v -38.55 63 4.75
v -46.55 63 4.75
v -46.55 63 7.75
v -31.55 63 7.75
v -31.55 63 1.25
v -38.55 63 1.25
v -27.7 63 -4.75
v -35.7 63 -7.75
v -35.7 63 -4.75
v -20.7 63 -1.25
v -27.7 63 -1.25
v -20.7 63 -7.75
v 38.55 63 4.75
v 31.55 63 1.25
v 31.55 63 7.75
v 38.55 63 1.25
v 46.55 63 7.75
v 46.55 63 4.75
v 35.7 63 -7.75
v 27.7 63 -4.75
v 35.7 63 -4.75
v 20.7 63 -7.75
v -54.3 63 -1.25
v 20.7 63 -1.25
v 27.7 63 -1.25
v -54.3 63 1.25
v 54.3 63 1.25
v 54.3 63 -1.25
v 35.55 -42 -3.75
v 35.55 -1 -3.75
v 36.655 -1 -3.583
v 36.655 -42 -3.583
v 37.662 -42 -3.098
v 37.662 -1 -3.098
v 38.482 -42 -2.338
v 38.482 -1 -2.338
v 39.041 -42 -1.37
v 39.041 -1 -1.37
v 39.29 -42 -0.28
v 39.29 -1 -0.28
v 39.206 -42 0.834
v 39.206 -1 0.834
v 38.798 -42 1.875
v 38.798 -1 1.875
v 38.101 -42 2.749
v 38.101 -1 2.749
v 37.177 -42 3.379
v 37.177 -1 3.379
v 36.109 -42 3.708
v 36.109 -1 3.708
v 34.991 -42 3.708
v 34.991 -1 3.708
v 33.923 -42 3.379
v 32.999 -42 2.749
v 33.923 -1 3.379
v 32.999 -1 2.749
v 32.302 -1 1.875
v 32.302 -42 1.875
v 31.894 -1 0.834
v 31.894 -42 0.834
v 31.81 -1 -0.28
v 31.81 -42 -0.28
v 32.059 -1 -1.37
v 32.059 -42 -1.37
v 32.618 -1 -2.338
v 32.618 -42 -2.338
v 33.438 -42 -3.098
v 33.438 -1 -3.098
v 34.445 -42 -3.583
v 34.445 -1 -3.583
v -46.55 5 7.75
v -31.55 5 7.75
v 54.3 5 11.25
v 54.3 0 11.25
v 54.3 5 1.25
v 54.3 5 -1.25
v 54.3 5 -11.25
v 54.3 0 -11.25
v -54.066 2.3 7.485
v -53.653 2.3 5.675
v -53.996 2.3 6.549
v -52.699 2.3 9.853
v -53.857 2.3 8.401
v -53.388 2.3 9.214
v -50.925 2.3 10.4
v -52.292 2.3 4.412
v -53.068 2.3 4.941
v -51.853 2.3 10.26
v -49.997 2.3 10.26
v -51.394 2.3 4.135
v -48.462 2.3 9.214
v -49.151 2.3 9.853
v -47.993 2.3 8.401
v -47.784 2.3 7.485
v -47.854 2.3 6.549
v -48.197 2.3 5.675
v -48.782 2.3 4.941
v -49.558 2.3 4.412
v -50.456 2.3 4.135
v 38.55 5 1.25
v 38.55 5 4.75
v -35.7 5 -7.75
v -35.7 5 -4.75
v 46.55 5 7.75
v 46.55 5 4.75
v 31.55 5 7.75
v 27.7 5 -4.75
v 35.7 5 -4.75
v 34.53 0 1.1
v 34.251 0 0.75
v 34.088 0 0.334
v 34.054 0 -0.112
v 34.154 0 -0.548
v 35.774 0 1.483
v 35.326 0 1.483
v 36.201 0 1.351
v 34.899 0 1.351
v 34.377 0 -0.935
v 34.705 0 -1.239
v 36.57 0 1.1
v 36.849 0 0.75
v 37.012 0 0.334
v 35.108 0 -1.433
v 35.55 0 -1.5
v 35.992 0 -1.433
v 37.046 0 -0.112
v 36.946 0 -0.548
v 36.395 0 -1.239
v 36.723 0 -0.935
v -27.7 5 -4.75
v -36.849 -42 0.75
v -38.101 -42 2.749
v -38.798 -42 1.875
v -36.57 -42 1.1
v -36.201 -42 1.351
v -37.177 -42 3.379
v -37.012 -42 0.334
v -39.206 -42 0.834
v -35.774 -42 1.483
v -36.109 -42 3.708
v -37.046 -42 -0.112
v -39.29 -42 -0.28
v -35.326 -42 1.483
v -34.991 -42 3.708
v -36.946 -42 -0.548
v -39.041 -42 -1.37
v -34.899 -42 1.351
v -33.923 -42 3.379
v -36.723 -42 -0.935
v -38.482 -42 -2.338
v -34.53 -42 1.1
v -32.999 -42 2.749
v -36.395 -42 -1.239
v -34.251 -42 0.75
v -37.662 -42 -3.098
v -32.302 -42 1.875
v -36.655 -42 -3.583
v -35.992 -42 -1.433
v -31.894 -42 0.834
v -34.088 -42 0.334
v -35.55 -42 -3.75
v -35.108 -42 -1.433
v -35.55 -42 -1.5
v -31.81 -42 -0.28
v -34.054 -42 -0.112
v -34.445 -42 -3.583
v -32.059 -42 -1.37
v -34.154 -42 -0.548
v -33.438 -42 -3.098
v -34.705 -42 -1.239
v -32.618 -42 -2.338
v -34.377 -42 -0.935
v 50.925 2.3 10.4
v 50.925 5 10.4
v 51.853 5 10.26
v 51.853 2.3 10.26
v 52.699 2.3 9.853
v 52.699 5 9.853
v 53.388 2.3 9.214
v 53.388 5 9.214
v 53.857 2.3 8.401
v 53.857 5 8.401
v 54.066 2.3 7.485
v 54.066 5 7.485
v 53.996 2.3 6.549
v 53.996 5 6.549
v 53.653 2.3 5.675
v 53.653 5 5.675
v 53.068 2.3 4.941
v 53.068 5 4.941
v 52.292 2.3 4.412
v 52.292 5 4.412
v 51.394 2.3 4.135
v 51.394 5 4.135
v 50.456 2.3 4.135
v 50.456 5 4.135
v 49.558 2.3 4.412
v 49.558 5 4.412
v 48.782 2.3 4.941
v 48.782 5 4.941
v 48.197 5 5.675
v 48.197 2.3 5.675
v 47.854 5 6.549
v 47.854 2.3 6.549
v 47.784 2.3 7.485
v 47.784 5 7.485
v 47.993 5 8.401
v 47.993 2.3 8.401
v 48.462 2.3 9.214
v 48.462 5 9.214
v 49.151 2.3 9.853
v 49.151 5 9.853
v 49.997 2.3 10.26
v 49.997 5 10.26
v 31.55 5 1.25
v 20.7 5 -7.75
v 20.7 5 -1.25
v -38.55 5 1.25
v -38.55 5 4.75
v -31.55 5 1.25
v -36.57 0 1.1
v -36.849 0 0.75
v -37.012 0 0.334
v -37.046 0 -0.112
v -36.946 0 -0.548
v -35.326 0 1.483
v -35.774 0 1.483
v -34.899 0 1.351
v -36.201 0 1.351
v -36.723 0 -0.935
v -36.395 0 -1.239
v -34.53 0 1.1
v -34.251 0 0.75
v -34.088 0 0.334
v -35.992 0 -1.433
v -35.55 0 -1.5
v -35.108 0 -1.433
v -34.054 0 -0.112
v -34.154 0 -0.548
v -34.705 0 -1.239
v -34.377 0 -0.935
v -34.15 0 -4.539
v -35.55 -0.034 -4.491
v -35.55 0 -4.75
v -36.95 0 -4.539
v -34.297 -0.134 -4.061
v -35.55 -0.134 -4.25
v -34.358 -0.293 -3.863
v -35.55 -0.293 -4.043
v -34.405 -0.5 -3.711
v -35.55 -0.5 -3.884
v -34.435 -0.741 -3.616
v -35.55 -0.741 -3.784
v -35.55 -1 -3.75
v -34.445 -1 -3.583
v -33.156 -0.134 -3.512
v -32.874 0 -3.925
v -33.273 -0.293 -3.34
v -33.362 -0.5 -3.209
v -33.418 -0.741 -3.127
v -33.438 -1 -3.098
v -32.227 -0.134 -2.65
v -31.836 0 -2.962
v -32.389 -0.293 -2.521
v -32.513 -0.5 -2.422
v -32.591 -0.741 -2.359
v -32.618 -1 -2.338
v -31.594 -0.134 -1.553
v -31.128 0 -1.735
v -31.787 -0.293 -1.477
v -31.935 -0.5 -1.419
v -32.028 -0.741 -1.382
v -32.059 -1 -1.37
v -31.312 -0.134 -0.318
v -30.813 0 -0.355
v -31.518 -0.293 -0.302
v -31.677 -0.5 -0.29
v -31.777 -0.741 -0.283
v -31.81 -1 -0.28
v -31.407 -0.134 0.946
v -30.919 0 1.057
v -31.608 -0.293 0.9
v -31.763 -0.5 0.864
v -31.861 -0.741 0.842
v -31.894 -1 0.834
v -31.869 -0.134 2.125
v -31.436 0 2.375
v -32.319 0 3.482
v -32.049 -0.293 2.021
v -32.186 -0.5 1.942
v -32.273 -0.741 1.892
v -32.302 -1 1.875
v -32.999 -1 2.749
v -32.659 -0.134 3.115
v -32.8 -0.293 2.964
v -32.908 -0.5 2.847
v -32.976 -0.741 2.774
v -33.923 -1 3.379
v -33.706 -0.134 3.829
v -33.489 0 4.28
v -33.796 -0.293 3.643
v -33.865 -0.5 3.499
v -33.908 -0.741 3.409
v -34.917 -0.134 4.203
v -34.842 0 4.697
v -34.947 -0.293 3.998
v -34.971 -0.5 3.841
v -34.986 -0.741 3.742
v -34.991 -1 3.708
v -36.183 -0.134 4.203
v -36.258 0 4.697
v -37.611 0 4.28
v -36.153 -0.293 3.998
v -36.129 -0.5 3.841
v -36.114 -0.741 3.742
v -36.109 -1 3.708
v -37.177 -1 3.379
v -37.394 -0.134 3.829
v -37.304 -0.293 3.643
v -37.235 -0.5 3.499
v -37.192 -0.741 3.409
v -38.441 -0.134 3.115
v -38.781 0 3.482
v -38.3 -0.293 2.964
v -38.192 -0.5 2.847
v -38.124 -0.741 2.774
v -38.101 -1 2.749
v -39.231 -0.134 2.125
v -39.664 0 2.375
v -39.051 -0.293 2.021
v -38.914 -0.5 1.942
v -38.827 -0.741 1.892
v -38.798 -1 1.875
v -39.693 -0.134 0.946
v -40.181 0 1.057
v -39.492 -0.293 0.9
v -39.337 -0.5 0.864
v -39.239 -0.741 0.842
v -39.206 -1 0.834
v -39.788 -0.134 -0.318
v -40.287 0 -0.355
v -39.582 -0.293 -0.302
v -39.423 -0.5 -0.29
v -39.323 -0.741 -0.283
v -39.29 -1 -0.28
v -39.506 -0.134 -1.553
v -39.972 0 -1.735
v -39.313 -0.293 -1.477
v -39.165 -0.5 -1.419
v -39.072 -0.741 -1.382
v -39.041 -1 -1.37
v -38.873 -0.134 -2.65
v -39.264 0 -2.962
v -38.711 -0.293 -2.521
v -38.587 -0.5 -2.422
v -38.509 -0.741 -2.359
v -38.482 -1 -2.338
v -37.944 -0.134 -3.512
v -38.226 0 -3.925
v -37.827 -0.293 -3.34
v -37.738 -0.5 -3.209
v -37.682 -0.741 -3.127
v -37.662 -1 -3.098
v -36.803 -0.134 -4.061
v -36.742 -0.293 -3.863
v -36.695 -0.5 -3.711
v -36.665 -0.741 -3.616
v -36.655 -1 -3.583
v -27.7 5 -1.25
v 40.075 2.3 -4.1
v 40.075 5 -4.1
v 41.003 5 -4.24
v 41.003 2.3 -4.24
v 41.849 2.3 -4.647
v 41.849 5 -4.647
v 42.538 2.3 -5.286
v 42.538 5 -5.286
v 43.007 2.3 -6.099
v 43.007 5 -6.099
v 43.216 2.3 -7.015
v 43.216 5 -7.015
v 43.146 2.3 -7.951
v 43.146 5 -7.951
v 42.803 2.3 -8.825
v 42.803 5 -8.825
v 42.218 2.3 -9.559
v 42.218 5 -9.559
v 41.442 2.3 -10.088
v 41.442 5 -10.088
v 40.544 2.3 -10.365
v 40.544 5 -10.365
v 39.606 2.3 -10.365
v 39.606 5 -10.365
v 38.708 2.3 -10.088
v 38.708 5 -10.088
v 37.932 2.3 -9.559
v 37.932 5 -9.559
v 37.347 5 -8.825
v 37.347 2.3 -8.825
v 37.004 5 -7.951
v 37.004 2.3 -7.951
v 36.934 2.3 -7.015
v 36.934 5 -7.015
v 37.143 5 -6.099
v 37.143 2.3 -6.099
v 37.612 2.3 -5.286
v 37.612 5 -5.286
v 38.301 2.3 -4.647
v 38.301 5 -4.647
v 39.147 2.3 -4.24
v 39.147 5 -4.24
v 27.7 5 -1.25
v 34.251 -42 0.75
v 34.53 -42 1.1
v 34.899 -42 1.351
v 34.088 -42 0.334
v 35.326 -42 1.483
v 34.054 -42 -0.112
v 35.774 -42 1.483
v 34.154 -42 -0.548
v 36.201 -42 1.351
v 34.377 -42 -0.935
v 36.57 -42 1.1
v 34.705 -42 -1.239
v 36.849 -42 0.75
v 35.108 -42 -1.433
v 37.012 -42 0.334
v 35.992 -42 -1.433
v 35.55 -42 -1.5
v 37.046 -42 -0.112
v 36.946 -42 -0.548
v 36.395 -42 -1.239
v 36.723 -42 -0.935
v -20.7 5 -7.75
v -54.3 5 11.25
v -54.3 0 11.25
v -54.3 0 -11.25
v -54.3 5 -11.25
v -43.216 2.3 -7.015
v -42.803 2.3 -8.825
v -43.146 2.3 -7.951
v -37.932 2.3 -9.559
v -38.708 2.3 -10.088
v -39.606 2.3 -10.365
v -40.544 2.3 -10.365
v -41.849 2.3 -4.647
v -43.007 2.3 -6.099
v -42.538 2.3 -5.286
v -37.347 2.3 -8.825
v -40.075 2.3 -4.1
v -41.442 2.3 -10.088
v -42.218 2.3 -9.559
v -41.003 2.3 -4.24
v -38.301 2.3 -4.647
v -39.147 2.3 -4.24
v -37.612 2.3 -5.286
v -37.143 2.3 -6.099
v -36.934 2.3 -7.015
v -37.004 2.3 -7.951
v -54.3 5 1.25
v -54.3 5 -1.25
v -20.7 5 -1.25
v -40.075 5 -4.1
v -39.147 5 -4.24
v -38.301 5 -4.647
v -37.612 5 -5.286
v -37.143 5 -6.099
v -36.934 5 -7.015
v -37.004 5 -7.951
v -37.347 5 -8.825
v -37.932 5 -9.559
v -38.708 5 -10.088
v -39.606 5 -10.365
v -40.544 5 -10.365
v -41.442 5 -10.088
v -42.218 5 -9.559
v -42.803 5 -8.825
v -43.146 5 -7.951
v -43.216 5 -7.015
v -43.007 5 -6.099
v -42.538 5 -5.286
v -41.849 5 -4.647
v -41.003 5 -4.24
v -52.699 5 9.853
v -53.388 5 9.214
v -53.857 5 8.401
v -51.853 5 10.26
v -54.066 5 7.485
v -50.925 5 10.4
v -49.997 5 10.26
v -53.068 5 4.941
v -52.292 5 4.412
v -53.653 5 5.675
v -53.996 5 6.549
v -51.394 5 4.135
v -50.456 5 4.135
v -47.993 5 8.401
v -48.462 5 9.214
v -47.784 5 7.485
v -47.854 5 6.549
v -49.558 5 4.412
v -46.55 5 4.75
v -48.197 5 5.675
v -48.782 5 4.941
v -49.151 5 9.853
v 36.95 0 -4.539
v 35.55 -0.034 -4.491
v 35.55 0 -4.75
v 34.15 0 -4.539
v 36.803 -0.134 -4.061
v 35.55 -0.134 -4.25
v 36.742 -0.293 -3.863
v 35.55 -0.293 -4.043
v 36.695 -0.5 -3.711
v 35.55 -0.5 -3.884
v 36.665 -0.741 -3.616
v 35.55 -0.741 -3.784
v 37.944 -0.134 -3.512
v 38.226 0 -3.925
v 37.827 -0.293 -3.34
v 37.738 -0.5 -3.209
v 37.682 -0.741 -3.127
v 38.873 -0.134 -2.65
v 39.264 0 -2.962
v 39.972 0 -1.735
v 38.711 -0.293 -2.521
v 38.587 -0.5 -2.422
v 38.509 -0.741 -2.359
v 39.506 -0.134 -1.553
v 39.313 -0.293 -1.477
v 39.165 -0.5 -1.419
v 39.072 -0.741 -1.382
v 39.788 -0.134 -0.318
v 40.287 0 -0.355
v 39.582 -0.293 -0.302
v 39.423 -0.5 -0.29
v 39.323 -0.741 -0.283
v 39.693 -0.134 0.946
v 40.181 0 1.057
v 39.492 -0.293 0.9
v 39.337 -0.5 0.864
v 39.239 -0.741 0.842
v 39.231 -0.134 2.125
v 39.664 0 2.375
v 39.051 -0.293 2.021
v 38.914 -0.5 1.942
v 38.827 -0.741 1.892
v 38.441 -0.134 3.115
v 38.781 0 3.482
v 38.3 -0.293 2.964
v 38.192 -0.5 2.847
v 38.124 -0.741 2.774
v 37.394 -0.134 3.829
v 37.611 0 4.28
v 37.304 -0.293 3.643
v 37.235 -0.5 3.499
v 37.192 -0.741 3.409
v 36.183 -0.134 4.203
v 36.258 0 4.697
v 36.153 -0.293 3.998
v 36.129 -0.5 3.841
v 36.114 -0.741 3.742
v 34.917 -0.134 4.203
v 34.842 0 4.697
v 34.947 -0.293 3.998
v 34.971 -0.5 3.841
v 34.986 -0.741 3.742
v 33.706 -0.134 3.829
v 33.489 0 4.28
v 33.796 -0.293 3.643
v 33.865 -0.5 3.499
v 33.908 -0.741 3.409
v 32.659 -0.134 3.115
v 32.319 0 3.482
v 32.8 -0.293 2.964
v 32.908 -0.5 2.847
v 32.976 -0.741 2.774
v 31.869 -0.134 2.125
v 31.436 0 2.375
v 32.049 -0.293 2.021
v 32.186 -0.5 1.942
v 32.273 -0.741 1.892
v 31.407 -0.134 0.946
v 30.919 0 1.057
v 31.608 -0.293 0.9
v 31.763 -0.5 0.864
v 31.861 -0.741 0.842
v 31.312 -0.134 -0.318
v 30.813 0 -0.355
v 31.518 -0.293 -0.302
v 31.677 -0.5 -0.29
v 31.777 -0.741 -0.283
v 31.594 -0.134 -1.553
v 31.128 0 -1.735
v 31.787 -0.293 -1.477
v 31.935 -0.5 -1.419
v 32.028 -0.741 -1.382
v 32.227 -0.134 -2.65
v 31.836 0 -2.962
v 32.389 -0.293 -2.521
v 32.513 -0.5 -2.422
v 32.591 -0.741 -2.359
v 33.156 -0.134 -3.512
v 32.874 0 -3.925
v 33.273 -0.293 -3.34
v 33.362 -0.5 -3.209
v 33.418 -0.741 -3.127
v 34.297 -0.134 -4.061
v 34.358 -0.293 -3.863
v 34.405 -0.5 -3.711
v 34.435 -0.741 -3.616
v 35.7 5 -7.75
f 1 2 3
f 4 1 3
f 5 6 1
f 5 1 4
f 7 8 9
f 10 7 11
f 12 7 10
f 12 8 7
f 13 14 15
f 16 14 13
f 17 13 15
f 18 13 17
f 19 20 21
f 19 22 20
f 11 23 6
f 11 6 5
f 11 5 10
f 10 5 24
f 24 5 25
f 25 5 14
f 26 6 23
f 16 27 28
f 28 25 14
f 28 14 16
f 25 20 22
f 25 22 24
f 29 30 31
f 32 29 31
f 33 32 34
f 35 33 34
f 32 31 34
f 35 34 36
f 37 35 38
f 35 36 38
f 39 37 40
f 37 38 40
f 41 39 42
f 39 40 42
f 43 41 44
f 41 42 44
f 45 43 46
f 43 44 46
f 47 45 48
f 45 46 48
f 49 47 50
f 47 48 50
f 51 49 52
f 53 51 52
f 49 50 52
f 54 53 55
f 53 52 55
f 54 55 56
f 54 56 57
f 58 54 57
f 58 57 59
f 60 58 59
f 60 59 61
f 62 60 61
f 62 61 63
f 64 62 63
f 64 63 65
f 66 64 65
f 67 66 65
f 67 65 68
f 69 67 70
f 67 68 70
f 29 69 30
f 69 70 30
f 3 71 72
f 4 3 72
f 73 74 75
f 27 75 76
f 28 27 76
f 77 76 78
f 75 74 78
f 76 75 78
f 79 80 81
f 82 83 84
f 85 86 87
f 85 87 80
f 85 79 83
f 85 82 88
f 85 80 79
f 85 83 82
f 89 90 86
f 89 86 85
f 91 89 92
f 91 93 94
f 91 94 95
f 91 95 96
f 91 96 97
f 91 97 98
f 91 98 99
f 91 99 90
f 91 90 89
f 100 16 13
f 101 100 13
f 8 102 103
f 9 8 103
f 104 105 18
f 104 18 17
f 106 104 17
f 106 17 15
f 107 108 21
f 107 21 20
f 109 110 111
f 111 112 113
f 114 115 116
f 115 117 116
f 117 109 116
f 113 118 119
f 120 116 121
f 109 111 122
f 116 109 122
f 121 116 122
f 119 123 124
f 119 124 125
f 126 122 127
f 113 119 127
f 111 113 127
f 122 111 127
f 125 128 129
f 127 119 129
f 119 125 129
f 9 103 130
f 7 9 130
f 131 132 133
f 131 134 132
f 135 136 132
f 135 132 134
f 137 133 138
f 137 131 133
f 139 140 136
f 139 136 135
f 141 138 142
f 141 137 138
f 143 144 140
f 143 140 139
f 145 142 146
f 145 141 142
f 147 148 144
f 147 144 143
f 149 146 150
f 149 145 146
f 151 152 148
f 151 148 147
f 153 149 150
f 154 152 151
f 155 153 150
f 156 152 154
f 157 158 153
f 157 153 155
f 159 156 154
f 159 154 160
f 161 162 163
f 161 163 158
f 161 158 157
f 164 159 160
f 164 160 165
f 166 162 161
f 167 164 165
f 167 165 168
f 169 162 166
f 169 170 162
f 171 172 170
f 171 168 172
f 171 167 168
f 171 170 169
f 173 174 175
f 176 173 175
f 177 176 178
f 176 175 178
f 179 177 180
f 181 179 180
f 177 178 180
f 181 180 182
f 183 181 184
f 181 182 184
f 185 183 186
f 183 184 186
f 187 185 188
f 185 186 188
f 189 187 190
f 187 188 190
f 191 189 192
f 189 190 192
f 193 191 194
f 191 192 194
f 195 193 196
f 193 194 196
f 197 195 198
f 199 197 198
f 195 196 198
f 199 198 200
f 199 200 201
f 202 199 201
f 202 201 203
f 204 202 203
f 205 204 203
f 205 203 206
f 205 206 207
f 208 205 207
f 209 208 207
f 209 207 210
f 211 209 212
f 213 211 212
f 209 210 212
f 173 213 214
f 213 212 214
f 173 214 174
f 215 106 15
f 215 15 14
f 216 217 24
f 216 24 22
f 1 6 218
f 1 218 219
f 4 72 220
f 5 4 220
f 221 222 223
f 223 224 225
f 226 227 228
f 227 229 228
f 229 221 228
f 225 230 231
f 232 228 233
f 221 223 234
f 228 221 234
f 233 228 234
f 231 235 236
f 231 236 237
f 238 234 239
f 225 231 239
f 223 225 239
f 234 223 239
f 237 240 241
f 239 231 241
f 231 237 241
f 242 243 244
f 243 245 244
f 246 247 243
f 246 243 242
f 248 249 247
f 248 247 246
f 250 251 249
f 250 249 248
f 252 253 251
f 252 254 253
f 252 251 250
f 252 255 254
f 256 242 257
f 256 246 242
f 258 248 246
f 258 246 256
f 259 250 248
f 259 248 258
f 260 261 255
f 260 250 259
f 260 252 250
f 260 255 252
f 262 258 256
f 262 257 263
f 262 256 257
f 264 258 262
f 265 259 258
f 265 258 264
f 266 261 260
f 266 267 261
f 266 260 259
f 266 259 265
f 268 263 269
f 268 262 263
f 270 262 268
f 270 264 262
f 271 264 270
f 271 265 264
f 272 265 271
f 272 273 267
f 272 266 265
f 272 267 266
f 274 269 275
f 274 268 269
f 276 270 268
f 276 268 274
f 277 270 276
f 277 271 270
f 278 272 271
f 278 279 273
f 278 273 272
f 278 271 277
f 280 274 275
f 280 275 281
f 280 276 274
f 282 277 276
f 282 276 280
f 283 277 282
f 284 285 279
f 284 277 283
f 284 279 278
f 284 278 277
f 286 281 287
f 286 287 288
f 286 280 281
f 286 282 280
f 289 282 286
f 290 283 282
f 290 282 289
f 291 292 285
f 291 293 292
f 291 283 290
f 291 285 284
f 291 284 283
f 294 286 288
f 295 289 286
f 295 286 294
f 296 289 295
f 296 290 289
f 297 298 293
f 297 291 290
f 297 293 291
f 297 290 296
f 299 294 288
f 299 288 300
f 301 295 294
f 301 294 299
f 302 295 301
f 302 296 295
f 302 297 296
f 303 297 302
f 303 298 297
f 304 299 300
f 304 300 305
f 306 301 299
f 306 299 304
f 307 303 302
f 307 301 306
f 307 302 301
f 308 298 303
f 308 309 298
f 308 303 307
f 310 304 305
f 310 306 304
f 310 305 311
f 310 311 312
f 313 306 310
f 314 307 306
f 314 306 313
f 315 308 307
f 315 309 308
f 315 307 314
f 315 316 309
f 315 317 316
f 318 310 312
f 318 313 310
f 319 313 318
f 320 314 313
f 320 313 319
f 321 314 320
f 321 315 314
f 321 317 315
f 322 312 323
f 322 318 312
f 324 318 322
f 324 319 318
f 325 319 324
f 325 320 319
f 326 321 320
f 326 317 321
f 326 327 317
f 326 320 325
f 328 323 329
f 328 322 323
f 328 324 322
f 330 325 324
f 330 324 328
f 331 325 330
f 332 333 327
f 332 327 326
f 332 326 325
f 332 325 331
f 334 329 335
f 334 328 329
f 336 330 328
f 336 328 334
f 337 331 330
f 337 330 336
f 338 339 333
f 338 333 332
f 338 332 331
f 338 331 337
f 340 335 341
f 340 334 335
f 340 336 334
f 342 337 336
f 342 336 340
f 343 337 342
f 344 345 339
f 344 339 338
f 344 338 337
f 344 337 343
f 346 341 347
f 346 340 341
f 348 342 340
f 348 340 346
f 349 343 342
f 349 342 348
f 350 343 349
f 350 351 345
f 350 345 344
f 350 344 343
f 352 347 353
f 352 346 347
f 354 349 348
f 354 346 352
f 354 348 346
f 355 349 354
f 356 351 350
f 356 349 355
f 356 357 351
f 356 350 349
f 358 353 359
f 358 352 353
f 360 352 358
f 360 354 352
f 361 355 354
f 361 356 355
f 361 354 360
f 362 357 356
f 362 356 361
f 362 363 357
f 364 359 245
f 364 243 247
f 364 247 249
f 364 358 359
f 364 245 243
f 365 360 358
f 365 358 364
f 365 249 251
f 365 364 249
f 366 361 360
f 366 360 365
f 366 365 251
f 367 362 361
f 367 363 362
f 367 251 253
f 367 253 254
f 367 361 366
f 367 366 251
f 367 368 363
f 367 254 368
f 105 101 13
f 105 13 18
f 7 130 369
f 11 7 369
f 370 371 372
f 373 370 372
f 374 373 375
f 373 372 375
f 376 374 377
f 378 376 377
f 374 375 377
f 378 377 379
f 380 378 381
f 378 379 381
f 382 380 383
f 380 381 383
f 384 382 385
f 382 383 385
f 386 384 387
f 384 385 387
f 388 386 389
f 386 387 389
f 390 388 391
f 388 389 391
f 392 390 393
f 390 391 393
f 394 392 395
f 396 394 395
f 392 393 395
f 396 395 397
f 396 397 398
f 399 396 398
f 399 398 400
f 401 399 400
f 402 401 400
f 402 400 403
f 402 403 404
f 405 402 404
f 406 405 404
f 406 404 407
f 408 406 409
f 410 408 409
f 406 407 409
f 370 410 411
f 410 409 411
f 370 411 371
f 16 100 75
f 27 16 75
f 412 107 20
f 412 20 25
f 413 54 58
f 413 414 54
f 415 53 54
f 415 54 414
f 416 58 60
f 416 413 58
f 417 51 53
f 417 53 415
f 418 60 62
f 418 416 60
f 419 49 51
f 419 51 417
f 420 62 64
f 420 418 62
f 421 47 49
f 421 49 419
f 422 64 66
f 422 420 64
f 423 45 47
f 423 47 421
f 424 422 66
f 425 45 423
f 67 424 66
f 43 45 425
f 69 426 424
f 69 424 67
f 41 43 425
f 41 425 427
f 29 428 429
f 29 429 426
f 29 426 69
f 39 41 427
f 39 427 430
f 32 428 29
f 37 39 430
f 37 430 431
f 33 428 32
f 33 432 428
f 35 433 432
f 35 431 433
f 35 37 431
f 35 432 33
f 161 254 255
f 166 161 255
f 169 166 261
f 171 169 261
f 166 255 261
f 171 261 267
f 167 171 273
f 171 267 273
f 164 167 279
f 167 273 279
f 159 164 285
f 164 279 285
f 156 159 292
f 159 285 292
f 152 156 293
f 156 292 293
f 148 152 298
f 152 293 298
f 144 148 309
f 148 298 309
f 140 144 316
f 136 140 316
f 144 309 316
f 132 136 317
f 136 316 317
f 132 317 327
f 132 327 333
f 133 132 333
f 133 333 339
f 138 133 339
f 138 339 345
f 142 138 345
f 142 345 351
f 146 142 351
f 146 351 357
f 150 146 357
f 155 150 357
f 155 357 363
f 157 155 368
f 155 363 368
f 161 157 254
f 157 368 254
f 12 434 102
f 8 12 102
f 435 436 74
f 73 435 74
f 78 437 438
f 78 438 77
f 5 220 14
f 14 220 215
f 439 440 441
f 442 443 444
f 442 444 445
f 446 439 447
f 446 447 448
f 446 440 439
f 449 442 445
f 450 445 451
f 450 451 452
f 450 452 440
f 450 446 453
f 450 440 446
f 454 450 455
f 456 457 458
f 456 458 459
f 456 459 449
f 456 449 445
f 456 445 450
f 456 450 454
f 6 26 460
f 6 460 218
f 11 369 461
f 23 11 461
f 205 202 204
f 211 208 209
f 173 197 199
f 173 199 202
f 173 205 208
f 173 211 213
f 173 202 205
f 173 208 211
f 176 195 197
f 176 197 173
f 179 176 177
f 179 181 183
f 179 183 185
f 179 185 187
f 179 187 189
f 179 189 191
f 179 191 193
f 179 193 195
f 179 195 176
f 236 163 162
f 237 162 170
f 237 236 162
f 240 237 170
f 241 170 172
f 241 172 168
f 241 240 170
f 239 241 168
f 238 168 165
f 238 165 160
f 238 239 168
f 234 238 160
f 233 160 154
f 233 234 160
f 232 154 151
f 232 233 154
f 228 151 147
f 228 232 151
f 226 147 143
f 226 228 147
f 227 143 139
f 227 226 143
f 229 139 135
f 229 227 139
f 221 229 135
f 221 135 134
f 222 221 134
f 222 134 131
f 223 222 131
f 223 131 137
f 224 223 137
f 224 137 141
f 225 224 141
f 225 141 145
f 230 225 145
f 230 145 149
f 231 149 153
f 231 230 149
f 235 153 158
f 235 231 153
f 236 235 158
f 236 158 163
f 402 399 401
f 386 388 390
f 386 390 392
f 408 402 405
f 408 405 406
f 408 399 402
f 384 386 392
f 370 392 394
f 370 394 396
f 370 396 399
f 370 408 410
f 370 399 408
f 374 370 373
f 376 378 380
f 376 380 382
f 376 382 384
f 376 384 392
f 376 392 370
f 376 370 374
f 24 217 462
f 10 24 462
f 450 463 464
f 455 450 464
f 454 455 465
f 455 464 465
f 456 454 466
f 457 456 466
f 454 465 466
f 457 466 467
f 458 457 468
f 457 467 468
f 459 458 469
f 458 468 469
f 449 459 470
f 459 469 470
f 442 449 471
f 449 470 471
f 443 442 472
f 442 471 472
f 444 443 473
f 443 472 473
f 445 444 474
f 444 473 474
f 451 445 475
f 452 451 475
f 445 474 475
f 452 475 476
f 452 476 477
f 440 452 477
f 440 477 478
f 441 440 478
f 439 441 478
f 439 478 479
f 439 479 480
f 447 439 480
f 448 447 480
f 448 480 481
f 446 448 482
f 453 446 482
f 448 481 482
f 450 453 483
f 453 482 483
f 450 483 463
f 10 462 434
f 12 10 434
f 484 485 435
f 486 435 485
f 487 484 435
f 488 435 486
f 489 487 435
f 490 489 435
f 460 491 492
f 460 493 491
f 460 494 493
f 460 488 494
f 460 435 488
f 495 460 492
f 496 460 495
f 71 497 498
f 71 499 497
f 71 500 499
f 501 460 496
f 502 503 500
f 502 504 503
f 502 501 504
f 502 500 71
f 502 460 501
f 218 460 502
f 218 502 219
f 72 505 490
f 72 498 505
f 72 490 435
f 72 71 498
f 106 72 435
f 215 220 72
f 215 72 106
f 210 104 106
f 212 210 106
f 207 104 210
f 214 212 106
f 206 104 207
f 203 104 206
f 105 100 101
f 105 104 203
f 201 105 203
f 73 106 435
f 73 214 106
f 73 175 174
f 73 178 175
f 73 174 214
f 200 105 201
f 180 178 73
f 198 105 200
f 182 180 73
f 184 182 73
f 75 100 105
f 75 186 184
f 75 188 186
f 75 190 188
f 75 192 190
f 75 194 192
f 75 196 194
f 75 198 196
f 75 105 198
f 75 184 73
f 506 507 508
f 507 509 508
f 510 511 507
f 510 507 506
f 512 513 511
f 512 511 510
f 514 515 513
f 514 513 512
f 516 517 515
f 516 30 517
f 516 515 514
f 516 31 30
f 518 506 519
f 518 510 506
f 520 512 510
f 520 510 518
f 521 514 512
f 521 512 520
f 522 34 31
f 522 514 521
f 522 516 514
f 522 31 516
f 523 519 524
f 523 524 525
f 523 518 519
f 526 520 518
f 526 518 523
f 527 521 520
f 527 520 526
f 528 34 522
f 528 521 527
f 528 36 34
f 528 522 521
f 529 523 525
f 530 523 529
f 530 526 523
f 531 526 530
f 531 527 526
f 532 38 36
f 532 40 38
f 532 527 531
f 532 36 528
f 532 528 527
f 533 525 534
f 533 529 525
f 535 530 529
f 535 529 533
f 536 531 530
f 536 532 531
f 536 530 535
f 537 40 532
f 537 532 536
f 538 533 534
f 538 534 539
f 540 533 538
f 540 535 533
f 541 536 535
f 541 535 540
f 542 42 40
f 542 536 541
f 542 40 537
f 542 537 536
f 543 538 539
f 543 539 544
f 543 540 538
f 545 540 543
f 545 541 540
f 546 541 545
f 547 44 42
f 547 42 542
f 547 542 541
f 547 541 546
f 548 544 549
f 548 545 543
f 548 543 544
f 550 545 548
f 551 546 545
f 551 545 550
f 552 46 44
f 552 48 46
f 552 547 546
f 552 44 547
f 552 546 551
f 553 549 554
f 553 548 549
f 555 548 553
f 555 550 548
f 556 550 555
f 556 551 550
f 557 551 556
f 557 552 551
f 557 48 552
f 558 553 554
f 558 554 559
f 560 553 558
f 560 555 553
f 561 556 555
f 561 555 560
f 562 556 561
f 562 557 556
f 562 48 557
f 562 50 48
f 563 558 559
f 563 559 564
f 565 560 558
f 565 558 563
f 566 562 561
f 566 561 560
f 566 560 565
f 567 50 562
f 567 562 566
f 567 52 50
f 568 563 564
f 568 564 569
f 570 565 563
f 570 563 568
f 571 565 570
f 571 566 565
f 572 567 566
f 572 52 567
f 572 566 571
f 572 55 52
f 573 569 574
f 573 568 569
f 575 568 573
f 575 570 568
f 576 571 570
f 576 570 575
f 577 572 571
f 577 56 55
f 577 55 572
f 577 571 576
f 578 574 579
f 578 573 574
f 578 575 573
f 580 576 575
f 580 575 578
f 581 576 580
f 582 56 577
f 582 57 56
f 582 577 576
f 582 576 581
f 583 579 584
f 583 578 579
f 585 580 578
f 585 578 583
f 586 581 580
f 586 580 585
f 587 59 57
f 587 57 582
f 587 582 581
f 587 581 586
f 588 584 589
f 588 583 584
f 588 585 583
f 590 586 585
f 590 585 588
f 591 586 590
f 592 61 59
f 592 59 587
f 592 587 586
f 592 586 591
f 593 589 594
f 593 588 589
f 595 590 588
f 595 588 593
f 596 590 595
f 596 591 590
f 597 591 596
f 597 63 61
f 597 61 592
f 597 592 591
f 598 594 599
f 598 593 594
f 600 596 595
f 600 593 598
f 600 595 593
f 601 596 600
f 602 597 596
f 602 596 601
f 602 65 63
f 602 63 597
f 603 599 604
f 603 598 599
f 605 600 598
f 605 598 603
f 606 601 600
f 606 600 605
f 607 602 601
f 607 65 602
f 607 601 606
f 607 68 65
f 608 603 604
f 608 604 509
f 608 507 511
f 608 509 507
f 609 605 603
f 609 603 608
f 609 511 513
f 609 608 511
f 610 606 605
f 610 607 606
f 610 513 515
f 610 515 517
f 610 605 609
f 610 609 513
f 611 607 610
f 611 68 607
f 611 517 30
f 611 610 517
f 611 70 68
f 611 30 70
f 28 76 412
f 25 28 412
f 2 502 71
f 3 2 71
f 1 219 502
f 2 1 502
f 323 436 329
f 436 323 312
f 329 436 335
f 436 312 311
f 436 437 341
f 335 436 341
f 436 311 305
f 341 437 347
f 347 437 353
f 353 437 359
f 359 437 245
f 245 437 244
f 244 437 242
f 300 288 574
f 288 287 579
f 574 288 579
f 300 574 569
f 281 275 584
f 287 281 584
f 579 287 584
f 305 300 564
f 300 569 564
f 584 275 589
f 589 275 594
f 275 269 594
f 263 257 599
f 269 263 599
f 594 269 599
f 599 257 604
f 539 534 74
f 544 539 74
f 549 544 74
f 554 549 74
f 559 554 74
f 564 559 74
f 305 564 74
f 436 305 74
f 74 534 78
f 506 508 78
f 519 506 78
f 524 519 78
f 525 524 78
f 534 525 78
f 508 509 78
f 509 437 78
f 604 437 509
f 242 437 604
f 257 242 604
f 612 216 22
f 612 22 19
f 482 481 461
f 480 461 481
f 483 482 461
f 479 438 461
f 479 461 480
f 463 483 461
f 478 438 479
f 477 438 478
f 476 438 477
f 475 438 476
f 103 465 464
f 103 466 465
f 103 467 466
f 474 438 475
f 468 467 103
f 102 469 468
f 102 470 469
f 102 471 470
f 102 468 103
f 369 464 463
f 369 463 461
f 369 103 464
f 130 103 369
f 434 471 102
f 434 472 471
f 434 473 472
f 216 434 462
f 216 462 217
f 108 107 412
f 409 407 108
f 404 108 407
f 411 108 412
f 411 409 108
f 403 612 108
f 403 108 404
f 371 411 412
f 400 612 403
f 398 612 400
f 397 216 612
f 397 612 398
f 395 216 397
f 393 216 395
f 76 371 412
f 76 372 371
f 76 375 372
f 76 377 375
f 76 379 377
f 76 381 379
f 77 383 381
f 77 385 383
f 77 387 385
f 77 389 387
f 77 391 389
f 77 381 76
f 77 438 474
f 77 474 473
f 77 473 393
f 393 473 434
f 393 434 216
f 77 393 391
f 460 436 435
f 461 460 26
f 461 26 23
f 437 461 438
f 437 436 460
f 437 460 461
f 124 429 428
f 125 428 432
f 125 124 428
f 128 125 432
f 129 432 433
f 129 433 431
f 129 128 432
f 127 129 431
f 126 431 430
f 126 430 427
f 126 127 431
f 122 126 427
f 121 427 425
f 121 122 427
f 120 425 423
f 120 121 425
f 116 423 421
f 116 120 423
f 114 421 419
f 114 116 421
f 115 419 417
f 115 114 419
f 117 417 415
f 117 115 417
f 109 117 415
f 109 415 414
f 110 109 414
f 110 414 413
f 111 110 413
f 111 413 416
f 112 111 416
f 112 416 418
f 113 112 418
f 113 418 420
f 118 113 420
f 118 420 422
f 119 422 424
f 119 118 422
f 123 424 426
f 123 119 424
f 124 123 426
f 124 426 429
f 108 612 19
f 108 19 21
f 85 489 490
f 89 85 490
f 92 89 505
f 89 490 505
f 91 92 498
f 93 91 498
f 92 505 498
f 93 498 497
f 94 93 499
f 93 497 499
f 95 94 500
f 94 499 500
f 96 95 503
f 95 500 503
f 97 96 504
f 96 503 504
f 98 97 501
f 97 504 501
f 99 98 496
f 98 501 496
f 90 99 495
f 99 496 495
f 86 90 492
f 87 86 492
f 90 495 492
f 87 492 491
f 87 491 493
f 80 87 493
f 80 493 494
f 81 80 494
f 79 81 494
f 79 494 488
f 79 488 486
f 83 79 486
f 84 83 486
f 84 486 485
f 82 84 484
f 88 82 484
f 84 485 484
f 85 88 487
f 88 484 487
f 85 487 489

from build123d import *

# Parameters (mm, degrees)
SKETCH1_W           = 108.6
SKETCH1_H           = 22.5
BOSS_EXTRUDE1_DEPTH = 5
SKETCH2_R           = 3.15
CUT_EXTRUDE1_DEPTH  = 2.7
BOSS_EXTRUDE2_DEPTH = 58
SKETCH4_R           = 3.75
SKETCH4_R_2         = 1.5
BOSS_EXTRUDE3_DEPTH = 42
FILLET1_R           = 1


with BuildPart() as part:
    # Sketch1 → Boss-Extrude1 (new body)
    with BuildSketch(Plane(origin=(0, 0, 0), x_dir=(1, 0, 0), z_dir=(0, 1, 0))):
        Rectangle(SKETCH1_W, SKETCH1_H)
    extrude(amount=BOSS_EXTRUDE1_DEPTH)

    # Sketch2 → Cut-Extrude1 (cut)
    with BuildSketch(Plane(origin=(0, 5, 0), x_dir=(1, 0, 0), z_dir=(0, 1, 0))):
        with Locations(Location((50.925, -7.25, 0), (0, 0, 270))):
            Circle(SKETCH2_R)
        with Locations(Location((40.075, 7.25, 0), (0, 0, 270))):
            Circle(SKETCH2_R)
        with Locations(Location((-50.925, -7.25, 0), (0, 0, 270))):
            Circle(SKETCH2_R)
        with Locations(Location((-40.075, 7.25, 0), (0, 0, 270))):
            Circle(SKETCH2_R)
    extrude(amount=-CUT_EXTRUDE1_DEPTH, mode=Mode.SUBTRACT)

    # Sketch3 → Boss-Extrude2 (add)
    with BuildSketch(Plane(origin=(0, 5, 0), x_dir=(1, 0, 0), z_dir=(0, 1, 0))):
        Polygon((-54.3, 1.25), (-54.3, 0), (54.3, 0), (54.3, 1.25), (-20.7, 1.25), (-27.7, 1.25), align=None)
        Polygon((54.3, 0), (-54.3, 0), (-54.3, -1.25), (-38.55, -1.25), (-31.55, -1.25), (54.3, -1.25), align=None)
        Polygon((-31.55, -1.25), (-38.55, -1.25), (-38.55, -4.75), (-46.55, -4.75), (-46.55, -7.75), (-31.55, -7.75), align=None)
        Polygon((-27.7, 4.75), (-27.7, 1.25), (-20.7, 1.25), (-20.7, 7.75), (-35.7, 7.75), (-35.7, 4.75), align=None)
    boss_extrude2 = extrude(amount=BOSS_EXTRUDE2_DEPTH)

    # Mirror1: Boss-Extrude2 across plane
    add(boss_extrude2.mirror(Plane(origin=(0, 0, 0), x_dir=(0, 0, 1), z_dir=(1, 0, 0))))

    # Sketch4 → Boss-Extrude3 (add)
    # profile 1 of 2: a face of its own
    with BuildSketch(Plane.XZ):
        with Locations(Location((-35.55, 0, 0), (0, 0, 270))):
            Circle(SKETCH4_R)
        with Locations(Location((-35.55, 0, 0), (0, 0, 270))):
            Circle(SKETCH4_R_2, mode=Mode.SUBTRACT)
    # profile 2 of 2: a face of its own
    with BuildSketch(Plane.XZ):
        with Locations(Location((35.55, 0, 0), (0, 0, 270))):
            Circle(SKETCH4_R)
        with Locations(Location((35.55, 0, 0), (0, 0, 270))):
            Circle(SKETCH4_R_2, mode=Mode.SUBTRACT)
    extrude(amount=BOSS_EXTRUDE3_DEPTH)

    # Fillet1
    fillet1_edges = [part.edges().sort_by_distance(p)[0] for p in [
        (-35.55, 0, 3.75),
        (35.55, 0, 3.75),
    ]]
    fillet(fillet1_edges, radius=FILLET1_R)


solid = part.part
